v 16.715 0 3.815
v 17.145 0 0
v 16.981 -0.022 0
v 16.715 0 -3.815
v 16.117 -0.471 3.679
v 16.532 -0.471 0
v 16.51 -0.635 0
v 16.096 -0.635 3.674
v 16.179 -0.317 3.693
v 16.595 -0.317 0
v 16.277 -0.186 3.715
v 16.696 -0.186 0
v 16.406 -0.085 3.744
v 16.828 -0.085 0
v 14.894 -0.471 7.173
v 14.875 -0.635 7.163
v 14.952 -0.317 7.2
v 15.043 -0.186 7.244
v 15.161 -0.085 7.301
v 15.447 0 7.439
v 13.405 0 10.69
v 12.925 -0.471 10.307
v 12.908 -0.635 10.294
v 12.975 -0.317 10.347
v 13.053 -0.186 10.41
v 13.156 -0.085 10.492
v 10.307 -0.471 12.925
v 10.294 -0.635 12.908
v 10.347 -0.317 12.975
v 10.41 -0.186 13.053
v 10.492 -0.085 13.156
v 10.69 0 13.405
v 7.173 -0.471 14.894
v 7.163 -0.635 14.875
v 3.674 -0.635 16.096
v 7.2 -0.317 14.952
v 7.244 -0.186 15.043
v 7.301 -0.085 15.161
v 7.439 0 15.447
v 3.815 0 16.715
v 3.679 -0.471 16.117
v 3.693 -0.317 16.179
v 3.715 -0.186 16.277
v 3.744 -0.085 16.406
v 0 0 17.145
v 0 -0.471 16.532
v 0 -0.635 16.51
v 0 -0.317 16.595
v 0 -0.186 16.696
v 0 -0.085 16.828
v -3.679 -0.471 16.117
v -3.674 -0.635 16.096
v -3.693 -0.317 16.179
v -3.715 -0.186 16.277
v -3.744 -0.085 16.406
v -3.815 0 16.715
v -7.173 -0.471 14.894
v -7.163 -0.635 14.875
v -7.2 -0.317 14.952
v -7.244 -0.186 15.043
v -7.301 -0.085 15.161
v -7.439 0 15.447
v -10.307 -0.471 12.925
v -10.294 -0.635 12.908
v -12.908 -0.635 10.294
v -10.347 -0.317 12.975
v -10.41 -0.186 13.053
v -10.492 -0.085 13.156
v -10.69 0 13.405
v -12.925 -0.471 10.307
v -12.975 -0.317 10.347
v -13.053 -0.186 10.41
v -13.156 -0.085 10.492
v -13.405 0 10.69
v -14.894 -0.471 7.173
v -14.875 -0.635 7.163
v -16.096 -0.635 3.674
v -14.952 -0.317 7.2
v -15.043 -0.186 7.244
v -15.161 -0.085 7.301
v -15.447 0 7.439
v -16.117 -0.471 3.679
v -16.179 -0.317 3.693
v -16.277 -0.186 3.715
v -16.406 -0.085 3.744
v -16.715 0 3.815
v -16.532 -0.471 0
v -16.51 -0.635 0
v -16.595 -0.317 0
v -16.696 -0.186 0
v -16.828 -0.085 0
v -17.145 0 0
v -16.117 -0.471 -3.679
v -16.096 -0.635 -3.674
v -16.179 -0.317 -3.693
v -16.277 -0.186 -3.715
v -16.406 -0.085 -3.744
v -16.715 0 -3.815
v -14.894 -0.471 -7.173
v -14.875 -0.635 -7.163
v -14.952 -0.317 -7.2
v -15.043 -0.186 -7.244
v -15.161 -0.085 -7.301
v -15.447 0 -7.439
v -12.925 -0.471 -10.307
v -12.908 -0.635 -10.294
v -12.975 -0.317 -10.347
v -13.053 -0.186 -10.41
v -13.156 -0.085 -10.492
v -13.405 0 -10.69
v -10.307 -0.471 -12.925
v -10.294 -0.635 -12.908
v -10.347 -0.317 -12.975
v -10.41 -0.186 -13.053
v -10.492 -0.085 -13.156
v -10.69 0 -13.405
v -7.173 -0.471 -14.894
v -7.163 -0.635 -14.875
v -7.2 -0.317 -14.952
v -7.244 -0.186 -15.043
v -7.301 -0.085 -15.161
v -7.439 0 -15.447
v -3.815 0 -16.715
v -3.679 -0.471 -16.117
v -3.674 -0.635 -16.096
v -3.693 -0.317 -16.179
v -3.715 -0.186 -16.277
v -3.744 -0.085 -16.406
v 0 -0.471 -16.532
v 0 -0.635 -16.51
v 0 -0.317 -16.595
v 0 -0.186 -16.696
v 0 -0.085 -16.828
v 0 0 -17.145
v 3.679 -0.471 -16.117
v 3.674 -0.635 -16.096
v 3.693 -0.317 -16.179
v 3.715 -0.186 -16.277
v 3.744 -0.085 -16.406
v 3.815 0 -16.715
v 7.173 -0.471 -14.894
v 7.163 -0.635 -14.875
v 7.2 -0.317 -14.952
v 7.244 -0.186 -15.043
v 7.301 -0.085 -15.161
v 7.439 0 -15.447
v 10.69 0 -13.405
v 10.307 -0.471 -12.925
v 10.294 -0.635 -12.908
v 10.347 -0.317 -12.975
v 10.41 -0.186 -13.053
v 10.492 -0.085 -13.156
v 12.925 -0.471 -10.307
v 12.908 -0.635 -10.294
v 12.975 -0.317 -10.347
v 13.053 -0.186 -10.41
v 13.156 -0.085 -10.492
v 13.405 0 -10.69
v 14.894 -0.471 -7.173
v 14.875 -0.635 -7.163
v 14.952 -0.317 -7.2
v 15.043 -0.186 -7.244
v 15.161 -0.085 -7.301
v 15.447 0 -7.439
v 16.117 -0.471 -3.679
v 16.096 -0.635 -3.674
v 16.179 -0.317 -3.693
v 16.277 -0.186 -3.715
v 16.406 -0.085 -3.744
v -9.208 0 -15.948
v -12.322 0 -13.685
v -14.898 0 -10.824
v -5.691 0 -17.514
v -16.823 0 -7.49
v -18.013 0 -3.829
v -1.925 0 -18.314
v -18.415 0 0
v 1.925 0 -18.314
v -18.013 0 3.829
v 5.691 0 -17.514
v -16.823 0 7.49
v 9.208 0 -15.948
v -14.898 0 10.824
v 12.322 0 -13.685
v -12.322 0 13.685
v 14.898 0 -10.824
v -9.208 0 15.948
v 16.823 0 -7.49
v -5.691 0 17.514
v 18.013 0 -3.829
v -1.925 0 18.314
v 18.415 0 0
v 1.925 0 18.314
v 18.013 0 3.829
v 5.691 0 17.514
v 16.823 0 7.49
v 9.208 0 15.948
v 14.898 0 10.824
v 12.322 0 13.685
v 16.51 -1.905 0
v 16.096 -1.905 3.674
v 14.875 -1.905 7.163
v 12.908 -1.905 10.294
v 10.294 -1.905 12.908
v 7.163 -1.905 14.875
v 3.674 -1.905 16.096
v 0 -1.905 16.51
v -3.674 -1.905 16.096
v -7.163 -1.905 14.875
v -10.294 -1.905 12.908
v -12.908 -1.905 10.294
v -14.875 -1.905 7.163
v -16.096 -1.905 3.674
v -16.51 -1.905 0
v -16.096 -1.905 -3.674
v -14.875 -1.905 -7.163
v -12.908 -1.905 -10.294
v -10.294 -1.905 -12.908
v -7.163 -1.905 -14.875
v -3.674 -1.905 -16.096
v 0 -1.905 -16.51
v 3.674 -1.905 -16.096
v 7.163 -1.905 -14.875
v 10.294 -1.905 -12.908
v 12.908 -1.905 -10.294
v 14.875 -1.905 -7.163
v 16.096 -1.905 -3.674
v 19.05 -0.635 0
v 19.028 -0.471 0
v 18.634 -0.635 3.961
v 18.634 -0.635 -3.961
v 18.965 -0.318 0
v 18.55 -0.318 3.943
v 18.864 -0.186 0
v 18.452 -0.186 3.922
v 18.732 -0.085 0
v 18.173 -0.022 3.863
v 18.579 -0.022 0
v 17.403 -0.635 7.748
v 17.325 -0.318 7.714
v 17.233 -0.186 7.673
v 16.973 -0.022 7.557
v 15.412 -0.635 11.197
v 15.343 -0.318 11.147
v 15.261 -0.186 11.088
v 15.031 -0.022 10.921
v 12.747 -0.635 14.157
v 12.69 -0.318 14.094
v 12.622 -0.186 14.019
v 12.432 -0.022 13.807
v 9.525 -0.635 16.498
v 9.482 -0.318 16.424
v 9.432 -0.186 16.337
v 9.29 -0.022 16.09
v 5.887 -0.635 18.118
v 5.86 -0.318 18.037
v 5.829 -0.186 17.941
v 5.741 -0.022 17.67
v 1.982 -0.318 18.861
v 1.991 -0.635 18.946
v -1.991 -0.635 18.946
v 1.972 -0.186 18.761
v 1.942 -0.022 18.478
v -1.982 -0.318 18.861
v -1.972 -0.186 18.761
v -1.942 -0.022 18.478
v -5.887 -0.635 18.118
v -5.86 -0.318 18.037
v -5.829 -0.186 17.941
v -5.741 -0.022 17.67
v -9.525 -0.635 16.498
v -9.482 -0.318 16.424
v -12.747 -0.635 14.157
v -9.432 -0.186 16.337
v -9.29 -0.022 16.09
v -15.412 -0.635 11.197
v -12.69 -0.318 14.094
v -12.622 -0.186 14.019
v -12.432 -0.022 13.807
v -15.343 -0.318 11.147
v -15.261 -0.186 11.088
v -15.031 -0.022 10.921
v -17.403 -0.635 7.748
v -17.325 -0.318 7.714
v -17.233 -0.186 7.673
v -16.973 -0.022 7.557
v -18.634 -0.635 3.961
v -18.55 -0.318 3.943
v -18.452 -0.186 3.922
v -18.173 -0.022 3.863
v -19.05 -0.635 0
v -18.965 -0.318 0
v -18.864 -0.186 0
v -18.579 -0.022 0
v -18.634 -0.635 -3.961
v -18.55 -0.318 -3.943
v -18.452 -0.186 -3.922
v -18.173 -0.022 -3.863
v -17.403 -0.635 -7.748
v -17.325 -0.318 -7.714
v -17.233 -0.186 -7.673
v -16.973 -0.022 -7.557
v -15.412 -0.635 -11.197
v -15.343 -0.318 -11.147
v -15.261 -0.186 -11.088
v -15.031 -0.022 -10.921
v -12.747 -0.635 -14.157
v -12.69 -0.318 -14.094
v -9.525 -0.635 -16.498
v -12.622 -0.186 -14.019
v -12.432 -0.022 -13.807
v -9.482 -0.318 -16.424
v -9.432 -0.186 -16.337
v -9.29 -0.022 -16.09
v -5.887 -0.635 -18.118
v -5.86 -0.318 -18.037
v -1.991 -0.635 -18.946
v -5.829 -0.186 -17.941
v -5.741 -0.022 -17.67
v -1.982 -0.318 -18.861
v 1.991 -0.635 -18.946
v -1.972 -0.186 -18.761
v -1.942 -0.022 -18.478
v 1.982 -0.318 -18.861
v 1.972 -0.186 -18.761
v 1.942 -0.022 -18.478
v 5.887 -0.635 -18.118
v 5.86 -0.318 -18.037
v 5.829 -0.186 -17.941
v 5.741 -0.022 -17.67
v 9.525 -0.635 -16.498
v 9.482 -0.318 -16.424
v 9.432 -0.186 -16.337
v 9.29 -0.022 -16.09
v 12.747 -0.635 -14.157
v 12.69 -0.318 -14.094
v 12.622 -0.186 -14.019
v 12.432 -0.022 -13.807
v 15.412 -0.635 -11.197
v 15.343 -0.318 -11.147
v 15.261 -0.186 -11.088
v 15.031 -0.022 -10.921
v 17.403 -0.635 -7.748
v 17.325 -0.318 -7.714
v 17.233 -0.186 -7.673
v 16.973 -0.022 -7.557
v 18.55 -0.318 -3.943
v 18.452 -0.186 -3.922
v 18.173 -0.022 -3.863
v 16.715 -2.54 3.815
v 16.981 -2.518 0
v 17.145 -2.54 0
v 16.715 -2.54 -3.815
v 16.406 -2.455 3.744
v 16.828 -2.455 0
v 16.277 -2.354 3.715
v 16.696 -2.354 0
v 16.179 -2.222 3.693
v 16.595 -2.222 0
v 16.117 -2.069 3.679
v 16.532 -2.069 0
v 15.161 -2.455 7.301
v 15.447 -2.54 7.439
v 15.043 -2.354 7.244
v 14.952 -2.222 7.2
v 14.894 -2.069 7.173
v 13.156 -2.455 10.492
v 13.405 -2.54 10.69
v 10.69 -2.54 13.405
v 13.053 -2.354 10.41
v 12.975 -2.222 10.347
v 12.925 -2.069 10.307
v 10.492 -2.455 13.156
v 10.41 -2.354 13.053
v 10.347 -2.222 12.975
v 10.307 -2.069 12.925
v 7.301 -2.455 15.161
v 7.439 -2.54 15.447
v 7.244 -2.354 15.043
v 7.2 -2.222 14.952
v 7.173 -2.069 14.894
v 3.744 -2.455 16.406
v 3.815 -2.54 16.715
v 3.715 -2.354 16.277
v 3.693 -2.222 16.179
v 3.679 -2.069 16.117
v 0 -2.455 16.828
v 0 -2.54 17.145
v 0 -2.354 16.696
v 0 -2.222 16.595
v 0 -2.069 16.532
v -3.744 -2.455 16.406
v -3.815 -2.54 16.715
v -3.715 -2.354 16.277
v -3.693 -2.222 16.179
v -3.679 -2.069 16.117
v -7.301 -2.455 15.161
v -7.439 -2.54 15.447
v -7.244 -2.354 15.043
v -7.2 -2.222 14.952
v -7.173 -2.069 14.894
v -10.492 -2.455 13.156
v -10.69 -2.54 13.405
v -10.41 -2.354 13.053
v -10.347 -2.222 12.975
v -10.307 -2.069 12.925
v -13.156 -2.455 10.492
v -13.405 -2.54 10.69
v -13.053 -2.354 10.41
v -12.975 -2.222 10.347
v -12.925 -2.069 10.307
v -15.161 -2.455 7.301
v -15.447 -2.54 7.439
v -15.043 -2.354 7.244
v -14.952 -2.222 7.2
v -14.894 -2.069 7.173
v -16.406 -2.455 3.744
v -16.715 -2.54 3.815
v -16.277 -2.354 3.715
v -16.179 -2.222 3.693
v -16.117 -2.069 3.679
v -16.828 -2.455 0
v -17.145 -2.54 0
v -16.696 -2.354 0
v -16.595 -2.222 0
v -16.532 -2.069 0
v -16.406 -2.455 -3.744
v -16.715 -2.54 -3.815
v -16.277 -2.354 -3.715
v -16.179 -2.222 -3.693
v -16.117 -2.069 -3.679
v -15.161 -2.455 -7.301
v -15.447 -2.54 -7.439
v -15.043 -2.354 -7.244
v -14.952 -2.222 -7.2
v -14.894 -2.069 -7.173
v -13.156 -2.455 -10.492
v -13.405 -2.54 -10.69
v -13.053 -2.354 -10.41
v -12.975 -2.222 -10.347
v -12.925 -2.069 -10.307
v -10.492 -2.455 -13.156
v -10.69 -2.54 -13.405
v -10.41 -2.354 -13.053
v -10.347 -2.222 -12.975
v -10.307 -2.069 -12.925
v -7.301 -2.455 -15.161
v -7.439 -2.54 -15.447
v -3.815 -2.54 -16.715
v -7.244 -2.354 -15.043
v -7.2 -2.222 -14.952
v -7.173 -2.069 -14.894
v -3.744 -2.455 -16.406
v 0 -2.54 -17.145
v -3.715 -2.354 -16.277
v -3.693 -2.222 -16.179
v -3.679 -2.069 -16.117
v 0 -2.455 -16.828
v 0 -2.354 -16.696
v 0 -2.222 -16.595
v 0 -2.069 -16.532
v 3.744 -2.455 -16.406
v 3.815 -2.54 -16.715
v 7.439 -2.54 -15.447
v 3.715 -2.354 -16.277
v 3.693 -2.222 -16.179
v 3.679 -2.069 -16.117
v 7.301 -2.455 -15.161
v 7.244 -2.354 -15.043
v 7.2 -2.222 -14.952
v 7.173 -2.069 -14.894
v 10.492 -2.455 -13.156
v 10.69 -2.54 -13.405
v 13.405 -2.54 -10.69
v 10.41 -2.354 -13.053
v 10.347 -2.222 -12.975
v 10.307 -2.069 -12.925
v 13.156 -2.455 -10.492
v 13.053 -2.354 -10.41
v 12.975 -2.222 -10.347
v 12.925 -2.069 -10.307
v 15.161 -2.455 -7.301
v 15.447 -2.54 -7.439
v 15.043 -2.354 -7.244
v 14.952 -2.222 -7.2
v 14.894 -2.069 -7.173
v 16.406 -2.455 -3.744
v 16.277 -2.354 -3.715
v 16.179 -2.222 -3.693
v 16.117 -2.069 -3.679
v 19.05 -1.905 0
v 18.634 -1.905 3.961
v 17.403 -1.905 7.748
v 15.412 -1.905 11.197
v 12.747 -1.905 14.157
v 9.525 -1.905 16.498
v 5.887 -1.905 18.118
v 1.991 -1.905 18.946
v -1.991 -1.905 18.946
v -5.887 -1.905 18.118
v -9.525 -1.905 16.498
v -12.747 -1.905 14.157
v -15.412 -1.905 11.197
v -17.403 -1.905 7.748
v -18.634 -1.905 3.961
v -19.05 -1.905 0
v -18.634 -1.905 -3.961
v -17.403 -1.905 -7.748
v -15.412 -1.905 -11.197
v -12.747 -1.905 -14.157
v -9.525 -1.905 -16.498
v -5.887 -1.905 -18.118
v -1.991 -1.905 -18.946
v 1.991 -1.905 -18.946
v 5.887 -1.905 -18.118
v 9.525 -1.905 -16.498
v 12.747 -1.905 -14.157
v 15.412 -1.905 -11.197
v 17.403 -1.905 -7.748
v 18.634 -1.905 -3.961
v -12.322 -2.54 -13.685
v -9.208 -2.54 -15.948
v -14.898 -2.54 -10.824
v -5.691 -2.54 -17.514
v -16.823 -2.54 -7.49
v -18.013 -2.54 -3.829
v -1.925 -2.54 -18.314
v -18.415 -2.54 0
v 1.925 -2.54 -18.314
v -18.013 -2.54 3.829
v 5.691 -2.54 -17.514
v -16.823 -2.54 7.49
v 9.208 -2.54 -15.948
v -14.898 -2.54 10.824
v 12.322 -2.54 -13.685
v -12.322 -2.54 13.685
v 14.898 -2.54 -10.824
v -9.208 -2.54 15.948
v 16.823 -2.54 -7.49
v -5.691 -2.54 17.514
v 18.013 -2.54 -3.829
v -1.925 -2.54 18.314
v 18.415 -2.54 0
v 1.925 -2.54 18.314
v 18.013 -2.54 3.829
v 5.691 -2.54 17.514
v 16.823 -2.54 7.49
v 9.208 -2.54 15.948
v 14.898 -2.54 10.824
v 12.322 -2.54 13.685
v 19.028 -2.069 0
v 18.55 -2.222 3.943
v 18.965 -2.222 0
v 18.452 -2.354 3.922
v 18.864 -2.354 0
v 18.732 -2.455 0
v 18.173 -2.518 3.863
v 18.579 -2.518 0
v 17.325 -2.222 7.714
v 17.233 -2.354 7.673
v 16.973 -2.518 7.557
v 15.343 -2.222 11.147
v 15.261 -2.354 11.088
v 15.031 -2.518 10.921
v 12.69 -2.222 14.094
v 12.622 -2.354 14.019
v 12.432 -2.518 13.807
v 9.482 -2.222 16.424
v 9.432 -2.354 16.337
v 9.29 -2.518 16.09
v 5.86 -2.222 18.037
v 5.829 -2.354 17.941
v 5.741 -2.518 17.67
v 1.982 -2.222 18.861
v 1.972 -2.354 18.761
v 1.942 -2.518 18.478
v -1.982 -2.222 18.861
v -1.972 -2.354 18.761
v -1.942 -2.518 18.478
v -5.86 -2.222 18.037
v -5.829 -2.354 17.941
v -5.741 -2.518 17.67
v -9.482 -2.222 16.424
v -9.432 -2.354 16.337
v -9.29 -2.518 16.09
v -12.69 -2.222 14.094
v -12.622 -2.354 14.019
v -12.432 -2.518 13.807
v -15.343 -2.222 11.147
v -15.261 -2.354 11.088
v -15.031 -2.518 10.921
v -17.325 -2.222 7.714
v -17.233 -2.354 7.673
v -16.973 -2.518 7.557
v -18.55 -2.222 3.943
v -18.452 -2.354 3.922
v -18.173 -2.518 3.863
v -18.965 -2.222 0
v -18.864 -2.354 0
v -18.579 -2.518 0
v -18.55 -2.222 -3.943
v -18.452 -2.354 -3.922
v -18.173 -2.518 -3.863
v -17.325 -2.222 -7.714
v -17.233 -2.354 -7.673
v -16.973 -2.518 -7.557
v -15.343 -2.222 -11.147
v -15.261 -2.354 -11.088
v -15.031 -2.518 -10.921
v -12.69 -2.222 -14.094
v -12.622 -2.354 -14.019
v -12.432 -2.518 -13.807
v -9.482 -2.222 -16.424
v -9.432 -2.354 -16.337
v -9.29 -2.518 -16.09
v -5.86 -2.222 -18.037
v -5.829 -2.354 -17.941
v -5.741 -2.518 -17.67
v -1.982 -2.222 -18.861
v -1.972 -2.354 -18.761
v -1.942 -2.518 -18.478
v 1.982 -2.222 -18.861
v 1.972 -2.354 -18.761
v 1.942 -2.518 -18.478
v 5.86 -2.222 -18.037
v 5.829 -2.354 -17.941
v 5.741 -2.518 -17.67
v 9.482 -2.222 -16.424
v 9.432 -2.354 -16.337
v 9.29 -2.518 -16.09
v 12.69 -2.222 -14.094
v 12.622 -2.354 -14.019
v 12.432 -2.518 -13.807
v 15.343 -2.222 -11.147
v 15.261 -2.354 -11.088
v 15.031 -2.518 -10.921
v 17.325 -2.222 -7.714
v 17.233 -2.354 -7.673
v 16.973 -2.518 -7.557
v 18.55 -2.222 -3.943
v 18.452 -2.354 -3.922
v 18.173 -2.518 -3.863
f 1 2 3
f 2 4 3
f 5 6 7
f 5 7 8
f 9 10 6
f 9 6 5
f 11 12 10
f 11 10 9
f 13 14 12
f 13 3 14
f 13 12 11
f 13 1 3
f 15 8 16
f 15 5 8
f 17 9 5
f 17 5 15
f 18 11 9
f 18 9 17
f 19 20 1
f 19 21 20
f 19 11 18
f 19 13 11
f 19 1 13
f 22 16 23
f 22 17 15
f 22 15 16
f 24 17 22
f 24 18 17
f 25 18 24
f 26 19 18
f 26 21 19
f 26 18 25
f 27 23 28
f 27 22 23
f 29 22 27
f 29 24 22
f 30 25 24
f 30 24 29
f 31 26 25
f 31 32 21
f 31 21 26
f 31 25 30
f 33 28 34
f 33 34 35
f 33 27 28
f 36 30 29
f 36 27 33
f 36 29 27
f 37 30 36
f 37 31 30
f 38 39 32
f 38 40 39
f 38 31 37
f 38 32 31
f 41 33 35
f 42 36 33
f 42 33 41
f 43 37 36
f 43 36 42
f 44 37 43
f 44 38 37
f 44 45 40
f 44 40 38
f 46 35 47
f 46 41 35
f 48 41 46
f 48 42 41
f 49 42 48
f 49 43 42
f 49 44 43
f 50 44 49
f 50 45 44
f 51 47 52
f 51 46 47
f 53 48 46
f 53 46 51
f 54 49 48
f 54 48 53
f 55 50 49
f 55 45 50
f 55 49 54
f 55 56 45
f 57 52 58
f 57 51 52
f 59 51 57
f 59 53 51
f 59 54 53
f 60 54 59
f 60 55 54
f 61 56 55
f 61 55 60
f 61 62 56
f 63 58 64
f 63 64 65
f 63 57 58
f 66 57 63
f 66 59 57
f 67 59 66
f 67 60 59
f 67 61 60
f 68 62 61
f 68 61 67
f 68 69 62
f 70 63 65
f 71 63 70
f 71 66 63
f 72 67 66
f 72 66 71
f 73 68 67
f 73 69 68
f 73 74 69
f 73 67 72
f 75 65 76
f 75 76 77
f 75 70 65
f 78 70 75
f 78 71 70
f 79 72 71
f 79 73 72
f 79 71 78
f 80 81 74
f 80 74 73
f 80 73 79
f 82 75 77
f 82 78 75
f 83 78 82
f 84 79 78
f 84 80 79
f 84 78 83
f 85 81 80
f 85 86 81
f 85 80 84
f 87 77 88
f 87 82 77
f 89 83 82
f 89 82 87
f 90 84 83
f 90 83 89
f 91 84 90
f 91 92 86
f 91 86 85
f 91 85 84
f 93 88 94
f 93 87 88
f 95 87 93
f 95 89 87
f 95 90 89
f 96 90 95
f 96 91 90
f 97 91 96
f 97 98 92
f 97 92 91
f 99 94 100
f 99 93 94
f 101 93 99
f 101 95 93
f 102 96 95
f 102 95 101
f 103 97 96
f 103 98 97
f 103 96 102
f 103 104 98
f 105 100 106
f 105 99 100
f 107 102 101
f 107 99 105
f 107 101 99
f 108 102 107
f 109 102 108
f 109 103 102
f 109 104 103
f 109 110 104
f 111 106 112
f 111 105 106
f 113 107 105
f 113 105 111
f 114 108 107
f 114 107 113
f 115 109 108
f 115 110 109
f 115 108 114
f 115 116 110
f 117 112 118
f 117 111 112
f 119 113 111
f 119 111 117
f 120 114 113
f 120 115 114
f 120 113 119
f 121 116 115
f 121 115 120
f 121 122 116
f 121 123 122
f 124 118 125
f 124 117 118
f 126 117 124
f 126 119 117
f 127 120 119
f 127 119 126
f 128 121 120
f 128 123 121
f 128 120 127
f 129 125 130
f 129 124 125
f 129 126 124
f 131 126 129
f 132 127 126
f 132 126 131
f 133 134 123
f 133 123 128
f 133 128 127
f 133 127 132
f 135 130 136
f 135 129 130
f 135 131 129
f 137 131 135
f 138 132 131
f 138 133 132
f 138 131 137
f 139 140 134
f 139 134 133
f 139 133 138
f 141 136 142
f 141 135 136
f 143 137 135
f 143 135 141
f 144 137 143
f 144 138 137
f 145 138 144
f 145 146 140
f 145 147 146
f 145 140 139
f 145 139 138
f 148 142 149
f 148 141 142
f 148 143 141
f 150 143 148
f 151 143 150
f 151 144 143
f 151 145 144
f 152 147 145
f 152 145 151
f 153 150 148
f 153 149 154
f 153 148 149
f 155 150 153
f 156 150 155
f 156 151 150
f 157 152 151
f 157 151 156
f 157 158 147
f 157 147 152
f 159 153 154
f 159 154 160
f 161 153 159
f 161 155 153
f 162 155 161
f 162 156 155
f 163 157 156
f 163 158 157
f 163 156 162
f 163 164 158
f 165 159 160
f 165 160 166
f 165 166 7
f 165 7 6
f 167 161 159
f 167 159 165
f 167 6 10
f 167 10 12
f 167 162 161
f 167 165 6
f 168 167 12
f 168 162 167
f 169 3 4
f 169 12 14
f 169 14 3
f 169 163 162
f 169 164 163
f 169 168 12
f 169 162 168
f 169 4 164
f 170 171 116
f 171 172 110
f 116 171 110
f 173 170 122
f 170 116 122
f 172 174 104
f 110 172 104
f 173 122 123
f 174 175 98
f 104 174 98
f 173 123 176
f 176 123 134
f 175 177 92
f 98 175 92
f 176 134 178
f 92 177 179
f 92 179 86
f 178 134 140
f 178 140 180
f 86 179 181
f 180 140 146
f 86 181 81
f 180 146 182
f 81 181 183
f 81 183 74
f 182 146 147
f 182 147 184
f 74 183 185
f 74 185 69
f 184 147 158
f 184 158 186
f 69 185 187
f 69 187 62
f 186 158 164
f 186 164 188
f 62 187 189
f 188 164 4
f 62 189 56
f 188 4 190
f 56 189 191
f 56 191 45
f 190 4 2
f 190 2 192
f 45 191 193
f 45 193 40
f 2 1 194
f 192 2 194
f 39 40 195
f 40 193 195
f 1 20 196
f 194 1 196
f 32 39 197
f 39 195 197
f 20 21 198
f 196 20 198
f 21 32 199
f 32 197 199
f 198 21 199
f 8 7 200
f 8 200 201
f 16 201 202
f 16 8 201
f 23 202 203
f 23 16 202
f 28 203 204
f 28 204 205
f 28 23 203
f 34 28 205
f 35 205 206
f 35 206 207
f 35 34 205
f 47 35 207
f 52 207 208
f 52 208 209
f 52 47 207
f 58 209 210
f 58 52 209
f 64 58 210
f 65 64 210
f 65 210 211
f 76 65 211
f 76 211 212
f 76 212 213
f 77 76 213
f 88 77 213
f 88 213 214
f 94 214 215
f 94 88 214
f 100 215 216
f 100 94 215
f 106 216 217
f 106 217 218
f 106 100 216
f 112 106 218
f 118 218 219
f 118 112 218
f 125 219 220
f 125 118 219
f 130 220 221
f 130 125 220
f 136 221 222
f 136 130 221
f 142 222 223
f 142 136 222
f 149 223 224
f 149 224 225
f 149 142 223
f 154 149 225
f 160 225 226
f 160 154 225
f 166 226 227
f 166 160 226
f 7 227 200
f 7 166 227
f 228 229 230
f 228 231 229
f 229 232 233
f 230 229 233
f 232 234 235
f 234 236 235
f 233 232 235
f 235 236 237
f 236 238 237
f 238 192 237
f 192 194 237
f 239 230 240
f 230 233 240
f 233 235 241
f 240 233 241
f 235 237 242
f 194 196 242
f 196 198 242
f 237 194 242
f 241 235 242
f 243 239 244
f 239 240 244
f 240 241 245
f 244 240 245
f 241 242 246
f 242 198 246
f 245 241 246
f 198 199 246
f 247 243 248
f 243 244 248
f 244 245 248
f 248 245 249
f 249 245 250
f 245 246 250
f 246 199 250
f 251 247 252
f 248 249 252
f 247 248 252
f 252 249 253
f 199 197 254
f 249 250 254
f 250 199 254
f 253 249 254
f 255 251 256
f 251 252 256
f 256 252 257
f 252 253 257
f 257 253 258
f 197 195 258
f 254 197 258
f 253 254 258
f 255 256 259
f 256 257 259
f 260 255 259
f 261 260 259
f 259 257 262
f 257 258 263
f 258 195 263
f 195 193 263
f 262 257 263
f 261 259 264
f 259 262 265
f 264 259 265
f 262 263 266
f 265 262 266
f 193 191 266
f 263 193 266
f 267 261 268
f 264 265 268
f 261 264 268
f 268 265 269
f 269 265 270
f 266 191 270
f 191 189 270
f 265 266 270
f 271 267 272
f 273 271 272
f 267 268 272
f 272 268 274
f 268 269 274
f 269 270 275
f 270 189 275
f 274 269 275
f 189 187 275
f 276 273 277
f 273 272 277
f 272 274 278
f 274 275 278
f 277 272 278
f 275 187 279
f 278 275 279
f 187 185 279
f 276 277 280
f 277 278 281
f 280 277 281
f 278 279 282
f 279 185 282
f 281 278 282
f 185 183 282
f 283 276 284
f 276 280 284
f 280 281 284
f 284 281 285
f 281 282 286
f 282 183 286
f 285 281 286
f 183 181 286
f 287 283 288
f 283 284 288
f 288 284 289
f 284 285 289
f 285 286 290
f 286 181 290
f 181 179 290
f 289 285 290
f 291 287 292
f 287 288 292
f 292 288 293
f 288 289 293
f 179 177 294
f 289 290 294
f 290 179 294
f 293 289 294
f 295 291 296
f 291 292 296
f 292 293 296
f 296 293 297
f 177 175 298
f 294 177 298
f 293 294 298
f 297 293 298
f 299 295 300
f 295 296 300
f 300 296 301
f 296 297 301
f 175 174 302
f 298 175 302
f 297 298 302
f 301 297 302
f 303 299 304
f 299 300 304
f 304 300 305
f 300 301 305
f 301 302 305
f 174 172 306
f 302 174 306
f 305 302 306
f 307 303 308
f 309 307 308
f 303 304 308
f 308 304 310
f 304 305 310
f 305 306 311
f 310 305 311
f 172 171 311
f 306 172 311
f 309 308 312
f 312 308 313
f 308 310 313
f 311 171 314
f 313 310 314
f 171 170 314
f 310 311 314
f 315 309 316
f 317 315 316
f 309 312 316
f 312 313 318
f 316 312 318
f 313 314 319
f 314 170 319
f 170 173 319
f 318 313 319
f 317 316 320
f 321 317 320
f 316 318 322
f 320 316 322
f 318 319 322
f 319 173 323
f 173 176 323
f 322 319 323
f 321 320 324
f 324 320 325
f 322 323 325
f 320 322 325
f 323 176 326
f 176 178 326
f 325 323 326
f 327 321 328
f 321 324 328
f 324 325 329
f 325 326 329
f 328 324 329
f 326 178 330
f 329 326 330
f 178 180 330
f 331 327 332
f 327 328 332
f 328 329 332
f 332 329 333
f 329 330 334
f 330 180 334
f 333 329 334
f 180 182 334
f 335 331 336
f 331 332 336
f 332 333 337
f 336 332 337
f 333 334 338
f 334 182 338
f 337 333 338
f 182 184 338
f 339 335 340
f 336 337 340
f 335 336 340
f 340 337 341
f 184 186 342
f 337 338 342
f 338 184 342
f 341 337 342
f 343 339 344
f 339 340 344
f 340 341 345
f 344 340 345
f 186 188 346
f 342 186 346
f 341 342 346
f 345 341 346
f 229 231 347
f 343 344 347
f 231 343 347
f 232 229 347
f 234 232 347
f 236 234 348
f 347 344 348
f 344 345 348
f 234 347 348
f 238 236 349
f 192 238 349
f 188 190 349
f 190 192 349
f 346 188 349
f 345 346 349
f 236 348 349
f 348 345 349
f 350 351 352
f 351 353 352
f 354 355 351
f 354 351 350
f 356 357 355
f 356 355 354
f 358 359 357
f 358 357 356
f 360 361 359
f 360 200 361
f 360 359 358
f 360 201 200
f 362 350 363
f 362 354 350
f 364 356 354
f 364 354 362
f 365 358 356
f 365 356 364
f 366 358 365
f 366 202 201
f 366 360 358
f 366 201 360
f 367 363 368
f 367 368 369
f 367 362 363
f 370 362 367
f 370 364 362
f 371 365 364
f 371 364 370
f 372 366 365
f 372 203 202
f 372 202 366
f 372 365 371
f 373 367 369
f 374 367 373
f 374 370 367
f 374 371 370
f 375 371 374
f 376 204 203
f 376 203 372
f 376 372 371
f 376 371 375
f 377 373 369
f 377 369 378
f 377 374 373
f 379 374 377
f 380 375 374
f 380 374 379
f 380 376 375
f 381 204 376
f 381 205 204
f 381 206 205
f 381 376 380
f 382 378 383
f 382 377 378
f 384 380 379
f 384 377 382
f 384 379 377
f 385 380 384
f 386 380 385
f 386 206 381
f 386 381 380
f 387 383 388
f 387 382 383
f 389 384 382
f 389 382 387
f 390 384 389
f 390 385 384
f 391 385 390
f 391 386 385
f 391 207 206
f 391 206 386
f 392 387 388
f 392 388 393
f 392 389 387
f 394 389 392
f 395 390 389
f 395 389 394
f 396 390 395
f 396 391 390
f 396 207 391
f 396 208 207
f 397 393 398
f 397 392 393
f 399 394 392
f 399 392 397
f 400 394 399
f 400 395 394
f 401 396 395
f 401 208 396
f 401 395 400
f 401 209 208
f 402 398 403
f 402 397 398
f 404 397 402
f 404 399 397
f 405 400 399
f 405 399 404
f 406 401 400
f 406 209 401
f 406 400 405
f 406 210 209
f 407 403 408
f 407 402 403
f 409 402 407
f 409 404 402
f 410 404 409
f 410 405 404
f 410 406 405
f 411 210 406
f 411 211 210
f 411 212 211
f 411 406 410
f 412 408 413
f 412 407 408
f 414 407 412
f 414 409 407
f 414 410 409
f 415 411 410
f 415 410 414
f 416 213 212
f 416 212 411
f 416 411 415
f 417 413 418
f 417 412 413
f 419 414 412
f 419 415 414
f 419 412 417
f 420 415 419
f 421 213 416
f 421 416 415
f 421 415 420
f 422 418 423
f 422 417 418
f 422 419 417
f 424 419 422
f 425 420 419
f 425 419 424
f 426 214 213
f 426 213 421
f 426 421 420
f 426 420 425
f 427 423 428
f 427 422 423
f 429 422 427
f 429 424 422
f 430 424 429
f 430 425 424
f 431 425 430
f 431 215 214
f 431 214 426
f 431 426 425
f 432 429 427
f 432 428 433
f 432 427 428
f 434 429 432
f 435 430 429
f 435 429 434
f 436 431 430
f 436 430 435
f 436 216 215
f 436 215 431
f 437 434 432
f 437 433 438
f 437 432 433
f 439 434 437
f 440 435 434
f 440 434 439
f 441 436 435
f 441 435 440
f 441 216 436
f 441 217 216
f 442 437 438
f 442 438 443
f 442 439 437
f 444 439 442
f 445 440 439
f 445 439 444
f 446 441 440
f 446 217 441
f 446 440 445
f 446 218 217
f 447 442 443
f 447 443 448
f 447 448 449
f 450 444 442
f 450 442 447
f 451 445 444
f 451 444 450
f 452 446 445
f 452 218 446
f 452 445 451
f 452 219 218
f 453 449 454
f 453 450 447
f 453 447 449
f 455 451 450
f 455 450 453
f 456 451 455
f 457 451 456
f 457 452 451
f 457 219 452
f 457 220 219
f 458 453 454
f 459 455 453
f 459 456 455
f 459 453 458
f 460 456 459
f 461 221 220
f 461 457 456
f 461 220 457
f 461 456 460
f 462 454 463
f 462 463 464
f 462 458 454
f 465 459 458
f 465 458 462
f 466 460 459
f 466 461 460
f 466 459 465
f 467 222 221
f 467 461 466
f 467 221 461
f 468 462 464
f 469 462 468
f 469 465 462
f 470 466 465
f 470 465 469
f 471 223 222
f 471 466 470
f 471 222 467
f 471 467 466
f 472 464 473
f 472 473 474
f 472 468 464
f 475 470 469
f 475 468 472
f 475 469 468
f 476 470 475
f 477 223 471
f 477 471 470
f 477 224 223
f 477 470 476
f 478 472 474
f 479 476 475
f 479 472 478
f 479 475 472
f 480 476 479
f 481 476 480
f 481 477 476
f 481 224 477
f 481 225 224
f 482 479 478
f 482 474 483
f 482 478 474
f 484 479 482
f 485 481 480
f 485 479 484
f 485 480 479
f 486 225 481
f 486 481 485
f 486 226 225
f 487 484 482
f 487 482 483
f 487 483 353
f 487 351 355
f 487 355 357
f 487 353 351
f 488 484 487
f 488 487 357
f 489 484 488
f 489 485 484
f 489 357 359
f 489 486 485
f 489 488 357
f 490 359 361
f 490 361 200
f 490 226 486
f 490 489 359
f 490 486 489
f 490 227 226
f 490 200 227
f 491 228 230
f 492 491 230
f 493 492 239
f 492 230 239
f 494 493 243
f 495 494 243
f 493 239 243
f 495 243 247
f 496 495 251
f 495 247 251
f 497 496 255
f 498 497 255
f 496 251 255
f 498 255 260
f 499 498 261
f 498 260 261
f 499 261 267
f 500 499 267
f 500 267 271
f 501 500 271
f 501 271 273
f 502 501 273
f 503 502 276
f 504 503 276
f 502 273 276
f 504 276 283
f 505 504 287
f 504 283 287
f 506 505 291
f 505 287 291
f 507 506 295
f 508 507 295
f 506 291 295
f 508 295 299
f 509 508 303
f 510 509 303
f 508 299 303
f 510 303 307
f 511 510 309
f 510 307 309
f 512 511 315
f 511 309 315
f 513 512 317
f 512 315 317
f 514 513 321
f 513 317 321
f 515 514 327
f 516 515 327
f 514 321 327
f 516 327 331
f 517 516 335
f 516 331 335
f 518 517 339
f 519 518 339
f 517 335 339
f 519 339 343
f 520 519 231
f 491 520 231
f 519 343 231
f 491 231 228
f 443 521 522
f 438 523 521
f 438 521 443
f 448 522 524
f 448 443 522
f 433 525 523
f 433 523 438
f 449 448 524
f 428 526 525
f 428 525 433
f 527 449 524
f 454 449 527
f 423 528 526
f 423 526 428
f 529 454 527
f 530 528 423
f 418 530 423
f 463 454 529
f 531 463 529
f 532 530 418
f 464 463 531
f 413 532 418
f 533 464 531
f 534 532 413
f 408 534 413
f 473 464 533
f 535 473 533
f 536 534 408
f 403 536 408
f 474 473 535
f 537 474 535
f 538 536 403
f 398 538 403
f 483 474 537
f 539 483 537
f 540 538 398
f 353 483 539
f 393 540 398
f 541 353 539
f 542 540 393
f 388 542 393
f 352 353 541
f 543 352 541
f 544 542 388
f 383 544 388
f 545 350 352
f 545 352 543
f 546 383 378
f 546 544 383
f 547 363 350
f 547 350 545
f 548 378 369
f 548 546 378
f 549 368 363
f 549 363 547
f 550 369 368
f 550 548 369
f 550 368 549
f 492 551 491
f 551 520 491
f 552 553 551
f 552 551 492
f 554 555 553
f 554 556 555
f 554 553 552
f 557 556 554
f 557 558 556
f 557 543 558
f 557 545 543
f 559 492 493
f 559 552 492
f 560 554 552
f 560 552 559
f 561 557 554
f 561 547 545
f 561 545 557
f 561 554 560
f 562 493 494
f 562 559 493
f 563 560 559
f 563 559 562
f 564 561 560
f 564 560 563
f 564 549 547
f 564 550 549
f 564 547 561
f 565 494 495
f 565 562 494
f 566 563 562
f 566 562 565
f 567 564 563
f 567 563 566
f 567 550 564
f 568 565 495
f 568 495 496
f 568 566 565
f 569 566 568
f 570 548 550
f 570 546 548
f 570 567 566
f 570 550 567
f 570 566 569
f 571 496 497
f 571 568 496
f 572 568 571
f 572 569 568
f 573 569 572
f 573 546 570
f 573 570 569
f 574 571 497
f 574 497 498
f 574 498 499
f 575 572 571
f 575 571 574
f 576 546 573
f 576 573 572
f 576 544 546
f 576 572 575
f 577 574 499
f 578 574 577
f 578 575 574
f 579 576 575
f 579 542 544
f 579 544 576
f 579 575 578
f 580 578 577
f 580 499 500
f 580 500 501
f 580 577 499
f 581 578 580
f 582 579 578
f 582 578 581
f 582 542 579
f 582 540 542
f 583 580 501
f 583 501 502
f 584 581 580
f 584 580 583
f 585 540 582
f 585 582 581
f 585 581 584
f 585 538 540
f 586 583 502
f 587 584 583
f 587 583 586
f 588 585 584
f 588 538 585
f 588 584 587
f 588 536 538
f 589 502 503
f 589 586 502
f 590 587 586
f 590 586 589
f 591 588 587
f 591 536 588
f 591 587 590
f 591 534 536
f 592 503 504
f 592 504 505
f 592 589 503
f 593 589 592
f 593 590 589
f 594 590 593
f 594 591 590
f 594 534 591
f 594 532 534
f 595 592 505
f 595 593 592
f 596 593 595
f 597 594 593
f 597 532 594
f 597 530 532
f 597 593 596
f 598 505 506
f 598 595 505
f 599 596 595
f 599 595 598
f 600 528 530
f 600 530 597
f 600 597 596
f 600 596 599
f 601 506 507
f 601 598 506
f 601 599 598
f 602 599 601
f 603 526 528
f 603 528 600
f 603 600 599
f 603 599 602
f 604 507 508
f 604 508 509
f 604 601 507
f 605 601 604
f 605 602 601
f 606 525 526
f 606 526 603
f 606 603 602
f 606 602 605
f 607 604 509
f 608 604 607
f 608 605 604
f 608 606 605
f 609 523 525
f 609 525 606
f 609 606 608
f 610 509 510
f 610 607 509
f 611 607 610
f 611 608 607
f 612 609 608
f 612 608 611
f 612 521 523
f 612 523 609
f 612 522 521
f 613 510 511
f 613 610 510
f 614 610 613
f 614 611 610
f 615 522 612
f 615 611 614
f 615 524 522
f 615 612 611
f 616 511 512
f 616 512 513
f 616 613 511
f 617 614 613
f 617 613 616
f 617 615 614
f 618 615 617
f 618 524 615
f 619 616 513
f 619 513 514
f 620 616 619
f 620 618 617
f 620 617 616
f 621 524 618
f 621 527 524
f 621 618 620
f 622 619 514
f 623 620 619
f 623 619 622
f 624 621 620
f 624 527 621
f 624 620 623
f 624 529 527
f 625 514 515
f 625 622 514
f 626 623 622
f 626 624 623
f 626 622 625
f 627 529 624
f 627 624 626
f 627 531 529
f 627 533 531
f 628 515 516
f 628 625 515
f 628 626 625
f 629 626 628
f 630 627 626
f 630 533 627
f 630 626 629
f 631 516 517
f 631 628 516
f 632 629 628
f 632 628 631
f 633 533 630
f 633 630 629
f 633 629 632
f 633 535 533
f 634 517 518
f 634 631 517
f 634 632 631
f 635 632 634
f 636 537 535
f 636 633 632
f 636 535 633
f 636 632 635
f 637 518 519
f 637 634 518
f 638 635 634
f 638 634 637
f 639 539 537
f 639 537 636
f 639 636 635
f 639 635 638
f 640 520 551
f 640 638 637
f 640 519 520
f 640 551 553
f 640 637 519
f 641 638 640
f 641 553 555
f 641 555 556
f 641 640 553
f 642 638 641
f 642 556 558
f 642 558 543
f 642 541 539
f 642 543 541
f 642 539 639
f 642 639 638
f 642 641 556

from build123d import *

# Parameters (mm, degrees)
F0_R     = 19.05
F0_R_2   = 16.51
F1_DEPTH = 2.54
F2_R     = 0.635
F3_R     = 0.635


with BuildPart() as f1:
    # F0 (on Front) → F1 (new body)
    with BuildSketch(Plane.XZ):
        Circle(F0_R)
        Circle(F0_R_2, mode=Mode.SUBTRACT)
    extrude(amount=F1_DEPTH)

    # F2
    f2_edges = [f1.edges().sort_by_distance(p)[0] for p in [
        (-16.51, 0, 0),
        (-19.05, 0, 0),
    ]]
    fillet(f2_edges, radius=F2_R)

    # F3
    f3_edges = [f1.edges().sort_by_distance(p)[0] for p in [
        (-16.51, -2.54, 0),
        (-19.05, -2.54, 0),
    ]]
    fillet(f3_edges, radius=F3_R)


solid = f1.part
